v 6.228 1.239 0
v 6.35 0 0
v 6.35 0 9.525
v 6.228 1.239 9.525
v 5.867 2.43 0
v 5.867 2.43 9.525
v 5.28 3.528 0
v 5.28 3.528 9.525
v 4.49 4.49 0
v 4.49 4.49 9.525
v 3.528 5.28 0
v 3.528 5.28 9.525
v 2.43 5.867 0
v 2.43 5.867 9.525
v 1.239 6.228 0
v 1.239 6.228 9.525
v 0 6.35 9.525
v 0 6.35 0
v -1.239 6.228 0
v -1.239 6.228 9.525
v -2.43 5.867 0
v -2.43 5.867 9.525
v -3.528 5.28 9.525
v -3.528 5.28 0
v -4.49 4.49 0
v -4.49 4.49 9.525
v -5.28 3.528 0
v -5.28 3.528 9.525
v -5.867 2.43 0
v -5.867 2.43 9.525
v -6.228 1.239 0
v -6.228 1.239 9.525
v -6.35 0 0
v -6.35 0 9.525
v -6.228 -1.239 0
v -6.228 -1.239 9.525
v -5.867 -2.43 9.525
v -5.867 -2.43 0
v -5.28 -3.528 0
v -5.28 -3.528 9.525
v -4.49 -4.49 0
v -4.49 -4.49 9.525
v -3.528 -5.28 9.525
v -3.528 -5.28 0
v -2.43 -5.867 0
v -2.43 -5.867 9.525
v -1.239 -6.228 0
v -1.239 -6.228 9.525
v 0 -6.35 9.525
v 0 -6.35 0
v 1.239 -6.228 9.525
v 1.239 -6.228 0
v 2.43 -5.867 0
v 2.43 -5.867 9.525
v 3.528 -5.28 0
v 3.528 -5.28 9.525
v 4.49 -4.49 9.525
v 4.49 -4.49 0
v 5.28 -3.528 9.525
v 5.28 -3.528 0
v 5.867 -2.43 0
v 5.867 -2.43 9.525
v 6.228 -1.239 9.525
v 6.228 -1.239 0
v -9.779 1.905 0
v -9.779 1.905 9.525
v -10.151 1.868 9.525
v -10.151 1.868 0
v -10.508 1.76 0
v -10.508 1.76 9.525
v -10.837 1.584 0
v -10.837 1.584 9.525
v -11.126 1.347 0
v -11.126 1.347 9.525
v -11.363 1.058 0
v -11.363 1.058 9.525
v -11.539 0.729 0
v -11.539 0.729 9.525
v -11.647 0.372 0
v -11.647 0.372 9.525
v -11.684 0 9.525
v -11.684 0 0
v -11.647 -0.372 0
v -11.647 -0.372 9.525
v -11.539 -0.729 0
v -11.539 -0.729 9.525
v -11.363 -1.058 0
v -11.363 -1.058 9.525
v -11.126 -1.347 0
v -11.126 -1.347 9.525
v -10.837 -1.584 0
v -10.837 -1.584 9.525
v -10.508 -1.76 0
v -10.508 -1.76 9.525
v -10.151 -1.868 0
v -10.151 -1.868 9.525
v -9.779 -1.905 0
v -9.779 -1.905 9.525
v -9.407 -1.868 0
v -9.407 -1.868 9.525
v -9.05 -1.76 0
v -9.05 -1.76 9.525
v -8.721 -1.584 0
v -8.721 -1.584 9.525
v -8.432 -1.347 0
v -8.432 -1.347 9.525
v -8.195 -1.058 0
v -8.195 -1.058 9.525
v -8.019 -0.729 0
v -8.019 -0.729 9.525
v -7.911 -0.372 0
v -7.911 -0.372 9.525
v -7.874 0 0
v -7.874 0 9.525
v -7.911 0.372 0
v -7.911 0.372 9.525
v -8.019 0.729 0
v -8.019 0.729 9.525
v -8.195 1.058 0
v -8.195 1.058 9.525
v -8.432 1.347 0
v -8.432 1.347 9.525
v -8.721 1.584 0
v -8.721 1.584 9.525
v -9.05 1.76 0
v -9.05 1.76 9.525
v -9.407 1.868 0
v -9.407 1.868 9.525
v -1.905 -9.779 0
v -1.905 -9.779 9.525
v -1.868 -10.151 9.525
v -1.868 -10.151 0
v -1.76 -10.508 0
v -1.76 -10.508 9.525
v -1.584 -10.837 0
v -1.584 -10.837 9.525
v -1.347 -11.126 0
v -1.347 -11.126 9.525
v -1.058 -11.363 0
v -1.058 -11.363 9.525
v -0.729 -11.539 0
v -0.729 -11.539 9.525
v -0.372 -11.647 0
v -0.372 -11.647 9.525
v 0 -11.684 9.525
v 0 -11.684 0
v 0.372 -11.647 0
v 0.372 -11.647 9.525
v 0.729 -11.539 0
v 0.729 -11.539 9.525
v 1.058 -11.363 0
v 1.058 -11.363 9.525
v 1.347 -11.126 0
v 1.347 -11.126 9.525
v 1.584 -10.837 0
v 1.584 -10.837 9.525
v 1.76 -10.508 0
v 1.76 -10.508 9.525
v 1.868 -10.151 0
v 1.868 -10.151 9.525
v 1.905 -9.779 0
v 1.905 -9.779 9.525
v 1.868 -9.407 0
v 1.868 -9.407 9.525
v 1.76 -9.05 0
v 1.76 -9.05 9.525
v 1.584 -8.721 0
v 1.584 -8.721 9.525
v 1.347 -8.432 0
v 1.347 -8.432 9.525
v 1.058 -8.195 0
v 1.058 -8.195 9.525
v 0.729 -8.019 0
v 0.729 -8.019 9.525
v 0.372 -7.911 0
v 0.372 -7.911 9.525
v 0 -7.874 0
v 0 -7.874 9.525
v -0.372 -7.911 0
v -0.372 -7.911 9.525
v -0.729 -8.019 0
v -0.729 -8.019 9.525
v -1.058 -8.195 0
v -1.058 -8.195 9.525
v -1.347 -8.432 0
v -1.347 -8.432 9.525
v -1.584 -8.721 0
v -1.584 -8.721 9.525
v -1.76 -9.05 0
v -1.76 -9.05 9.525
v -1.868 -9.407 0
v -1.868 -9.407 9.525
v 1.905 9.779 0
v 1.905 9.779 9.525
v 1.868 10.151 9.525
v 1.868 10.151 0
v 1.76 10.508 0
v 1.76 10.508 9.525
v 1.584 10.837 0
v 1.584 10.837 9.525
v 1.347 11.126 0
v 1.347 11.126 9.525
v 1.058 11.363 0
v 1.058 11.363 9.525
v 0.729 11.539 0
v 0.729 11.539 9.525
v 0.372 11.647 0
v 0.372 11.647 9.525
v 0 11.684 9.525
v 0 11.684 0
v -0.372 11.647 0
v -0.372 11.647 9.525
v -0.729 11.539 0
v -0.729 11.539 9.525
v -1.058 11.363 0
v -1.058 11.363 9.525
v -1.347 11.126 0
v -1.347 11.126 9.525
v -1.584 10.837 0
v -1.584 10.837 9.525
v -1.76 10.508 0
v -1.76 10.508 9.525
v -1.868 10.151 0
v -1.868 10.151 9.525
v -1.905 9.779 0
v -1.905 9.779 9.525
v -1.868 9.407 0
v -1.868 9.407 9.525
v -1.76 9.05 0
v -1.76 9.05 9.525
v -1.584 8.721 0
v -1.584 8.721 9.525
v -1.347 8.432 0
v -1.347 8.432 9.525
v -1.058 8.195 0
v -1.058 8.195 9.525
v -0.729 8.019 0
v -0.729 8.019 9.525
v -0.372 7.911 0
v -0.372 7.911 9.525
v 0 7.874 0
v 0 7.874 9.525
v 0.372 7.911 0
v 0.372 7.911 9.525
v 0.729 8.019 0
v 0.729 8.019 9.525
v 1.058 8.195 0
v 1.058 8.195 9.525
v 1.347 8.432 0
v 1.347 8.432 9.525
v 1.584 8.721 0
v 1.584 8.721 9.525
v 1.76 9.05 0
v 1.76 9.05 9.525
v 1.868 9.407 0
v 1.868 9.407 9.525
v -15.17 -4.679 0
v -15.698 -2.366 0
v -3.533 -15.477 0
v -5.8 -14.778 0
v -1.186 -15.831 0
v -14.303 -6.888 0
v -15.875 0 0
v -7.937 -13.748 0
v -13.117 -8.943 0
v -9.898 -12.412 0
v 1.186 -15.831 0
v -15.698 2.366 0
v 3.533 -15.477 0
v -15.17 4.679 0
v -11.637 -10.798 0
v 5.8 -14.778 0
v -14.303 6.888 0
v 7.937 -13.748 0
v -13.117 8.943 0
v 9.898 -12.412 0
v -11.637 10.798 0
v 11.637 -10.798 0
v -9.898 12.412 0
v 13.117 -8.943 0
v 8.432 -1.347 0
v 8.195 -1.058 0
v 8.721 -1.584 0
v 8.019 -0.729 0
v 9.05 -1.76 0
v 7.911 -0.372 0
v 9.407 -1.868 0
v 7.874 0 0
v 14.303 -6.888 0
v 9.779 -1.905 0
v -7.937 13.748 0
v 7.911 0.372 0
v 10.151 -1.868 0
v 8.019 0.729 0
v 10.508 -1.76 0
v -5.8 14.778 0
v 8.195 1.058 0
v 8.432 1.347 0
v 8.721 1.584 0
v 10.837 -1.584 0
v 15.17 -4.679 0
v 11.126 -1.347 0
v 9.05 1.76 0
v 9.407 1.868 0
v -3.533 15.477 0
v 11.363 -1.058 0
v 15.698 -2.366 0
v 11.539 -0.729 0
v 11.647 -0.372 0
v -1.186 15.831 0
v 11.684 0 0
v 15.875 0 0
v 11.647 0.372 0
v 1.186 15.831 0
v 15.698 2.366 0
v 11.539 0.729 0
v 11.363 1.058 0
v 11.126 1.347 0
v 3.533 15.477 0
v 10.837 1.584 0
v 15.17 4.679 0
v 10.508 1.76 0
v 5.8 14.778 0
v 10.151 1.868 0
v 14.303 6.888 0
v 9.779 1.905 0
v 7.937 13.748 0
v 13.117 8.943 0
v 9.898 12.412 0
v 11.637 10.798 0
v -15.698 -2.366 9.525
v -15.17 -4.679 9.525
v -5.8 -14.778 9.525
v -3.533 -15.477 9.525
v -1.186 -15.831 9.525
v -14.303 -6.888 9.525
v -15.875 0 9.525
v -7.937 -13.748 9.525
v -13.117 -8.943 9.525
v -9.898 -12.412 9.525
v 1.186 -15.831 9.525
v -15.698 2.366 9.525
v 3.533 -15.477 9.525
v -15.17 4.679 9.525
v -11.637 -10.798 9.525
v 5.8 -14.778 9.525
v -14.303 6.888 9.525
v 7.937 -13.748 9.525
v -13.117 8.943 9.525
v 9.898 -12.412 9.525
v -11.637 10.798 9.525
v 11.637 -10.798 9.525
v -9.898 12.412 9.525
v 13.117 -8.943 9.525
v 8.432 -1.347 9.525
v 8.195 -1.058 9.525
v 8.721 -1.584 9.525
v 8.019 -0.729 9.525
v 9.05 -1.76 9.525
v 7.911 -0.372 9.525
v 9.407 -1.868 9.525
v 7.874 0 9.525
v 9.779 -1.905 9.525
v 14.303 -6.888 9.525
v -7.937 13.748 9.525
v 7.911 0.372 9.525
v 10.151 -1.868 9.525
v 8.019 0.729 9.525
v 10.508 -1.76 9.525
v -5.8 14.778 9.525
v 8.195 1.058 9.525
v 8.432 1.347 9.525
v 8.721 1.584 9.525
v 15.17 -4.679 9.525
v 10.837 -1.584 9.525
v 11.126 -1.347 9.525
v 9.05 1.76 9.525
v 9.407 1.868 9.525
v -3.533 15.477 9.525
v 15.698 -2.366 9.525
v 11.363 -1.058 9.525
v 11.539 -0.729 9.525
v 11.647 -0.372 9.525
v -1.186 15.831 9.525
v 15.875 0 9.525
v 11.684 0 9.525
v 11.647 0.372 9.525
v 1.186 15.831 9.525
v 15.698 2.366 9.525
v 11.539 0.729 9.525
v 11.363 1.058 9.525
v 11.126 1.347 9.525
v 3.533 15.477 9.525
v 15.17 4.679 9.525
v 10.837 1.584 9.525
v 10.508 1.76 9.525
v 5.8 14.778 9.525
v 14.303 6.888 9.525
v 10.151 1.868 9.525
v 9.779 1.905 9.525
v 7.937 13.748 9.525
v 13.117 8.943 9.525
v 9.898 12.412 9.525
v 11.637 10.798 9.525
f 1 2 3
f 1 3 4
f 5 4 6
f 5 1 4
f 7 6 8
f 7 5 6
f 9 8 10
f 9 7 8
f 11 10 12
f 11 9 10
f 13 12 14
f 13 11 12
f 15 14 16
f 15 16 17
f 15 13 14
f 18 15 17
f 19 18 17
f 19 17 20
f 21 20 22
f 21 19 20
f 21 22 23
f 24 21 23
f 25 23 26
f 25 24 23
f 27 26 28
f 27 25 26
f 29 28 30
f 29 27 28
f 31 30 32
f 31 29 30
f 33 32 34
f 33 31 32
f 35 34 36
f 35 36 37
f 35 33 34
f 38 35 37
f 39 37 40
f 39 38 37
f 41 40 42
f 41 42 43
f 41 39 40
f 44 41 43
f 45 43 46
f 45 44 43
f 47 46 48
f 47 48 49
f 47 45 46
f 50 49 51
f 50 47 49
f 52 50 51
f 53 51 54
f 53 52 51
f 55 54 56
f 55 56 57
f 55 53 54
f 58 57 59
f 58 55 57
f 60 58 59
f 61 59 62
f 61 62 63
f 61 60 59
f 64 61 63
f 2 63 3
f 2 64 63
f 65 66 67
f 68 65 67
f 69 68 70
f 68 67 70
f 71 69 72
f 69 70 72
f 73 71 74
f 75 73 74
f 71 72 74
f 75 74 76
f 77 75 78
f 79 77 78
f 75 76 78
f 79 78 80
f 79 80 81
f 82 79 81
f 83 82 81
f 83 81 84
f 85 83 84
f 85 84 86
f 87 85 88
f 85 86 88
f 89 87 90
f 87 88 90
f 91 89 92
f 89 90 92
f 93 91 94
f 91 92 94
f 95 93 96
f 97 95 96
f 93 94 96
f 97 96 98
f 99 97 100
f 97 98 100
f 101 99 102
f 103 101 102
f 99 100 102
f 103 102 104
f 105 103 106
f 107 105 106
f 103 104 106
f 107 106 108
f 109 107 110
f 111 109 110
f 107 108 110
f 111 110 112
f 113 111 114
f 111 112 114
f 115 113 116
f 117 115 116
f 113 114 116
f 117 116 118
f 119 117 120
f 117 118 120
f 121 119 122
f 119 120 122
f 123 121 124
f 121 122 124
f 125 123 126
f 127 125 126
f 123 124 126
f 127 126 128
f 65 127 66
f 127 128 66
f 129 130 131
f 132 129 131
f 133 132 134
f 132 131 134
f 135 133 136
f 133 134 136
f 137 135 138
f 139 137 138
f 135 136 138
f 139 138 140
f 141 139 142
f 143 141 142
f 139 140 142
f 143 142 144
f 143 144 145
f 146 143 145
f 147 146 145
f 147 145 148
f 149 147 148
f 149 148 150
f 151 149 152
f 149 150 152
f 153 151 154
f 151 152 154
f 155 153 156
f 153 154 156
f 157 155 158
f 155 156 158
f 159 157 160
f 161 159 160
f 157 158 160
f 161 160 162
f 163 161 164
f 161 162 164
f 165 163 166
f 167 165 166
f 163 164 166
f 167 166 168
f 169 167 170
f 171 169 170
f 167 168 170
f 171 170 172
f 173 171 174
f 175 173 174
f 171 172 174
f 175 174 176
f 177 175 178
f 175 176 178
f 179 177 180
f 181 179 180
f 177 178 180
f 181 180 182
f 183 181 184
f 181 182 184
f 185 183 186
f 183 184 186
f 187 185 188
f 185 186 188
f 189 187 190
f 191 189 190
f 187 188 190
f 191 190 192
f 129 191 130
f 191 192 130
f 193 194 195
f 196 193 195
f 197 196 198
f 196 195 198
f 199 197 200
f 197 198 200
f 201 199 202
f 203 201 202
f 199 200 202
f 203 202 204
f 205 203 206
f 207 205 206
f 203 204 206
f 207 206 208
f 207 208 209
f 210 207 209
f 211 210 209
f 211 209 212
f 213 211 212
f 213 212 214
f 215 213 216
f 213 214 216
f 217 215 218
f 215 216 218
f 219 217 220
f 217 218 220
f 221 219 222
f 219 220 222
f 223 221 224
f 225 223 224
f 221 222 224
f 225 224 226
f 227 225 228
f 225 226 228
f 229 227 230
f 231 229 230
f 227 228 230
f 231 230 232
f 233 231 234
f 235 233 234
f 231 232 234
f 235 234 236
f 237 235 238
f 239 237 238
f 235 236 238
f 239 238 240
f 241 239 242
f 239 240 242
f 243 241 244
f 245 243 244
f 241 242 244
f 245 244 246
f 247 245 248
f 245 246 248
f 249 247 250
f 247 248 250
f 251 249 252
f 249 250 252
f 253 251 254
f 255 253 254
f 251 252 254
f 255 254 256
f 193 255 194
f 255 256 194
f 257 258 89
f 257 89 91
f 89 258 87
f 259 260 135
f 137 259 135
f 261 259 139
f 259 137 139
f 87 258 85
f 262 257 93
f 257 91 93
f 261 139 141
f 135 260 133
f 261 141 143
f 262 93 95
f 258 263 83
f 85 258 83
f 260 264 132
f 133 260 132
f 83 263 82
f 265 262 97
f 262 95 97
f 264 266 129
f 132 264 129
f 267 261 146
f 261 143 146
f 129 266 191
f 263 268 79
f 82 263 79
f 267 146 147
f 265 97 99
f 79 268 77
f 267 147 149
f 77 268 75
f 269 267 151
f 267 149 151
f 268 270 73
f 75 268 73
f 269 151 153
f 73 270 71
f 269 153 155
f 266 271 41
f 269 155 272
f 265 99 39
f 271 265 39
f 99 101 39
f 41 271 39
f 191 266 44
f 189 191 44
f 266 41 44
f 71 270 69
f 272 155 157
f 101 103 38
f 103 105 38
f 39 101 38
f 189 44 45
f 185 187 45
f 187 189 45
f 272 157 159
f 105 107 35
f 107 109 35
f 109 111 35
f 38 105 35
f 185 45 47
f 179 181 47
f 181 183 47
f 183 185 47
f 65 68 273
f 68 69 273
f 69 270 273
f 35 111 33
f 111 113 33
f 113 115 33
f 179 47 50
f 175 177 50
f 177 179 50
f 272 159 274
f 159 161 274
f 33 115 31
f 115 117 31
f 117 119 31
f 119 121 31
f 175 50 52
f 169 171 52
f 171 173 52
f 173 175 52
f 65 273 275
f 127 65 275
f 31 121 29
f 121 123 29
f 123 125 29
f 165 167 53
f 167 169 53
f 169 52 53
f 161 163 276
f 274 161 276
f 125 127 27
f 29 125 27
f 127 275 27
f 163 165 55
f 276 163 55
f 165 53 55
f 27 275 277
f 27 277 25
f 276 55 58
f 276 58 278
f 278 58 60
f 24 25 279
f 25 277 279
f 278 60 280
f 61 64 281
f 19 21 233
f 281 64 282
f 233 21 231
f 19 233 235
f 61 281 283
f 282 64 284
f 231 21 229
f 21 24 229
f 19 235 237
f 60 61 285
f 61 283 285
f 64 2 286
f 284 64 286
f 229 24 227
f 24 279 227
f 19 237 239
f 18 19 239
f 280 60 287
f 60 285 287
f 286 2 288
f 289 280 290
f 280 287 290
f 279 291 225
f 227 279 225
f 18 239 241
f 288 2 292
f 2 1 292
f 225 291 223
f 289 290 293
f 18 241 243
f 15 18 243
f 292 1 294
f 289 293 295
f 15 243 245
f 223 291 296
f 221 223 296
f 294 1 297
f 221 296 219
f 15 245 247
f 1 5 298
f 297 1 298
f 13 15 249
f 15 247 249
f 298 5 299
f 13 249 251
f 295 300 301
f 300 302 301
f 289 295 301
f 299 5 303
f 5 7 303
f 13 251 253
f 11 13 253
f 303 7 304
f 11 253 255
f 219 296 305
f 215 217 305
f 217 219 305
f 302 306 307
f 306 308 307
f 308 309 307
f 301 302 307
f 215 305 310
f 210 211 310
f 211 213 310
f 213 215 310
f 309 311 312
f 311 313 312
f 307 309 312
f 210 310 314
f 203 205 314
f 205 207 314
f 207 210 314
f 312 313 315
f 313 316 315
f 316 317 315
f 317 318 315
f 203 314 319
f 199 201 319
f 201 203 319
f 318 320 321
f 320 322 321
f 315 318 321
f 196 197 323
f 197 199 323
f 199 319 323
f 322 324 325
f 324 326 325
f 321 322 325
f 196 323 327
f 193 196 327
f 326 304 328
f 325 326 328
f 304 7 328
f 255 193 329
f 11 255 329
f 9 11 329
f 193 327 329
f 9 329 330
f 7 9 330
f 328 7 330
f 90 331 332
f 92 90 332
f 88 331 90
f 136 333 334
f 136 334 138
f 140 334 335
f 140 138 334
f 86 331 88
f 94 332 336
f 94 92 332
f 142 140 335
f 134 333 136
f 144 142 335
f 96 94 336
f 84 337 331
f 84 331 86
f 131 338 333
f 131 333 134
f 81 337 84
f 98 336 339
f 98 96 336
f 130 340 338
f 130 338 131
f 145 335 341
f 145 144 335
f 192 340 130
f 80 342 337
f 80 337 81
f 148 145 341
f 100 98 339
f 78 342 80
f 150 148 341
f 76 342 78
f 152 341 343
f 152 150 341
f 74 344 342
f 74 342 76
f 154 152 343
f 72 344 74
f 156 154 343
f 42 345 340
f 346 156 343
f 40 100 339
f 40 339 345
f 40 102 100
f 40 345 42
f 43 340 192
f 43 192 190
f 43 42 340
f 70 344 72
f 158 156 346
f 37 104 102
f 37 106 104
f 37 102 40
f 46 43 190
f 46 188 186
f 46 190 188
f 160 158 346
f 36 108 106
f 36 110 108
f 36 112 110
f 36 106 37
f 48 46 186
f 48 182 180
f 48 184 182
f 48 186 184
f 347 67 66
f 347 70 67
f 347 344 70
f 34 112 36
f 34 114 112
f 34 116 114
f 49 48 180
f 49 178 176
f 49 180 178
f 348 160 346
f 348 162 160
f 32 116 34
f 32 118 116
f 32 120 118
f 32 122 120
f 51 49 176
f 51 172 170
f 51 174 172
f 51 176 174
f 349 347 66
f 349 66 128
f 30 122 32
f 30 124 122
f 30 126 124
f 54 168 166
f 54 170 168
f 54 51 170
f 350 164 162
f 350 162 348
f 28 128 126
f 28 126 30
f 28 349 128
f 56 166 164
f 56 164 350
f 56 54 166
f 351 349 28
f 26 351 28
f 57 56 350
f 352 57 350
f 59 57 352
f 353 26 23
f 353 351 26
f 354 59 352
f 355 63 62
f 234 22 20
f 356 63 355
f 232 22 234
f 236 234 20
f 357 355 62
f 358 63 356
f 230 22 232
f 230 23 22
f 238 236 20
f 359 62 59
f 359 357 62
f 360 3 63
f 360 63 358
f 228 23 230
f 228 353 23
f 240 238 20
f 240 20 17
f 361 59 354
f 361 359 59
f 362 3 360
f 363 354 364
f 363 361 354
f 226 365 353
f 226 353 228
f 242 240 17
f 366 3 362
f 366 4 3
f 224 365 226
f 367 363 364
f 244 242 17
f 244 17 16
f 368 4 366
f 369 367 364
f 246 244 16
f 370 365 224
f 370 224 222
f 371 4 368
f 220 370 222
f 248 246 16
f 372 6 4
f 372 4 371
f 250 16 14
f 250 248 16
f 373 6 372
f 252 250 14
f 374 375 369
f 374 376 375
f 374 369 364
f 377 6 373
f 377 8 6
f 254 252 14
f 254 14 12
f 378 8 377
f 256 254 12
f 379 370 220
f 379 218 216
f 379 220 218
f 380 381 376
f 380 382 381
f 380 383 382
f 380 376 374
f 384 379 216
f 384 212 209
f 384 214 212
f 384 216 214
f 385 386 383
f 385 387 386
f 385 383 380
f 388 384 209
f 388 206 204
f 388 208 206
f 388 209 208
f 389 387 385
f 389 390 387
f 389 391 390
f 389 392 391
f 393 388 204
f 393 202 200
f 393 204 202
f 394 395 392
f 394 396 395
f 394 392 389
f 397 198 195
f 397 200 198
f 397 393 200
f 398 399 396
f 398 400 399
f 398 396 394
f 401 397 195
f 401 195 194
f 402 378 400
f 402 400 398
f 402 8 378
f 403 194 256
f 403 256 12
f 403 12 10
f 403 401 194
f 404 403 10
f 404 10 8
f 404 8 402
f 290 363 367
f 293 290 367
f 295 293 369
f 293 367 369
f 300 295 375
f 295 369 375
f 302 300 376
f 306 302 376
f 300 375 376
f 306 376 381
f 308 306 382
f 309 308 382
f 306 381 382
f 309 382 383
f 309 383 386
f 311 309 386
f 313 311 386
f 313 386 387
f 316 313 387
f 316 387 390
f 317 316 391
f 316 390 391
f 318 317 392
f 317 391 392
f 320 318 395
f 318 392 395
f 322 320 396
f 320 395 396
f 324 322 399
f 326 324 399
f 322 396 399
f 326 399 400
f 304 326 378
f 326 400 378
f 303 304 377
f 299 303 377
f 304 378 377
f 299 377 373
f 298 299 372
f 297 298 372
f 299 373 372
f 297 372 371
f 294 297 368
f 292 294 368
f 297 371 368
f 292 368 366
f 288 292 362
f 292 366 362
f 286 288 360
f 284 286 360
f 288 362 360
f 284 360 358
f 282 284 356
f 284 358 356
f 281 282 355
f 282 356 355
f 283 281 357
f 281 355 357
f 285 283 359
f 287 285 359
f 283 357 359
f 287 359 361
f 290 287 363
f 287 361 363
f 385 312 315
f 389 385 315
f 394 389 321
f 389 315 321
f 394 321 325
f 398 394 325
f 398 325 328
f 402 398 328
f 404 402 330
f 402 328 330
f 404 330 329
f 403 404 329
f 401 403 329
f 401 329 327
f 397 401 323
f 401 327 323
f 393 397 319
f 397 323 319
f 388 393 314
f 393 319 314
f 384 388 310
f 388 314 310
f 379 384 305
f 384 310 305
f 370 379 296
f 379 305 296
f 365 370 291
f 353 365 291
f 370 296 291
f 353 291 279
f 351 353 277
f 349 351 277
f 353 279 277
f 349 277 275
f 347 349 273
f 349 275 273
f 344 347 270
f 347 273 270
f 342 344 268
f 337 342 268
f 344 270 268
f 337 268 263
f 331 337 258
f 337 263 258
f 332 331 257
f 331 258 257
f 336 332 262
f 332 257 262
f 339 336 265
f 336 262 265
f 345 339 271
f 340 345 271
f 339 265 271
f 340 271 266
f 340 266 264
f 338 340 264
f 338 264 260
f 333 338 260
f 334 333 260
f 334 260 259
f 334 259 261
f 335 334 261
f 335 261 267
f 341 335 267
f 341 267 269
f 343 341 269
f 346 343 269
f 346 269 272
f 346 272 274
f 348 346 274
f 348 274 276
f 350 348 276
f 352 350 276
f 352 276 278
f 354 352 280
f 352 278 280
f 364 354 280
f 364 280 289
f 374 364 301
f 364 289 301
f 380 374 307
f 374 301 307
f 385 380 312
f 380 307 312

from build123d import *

# Parameters (mm, degrees)
SKETCH1_R           = 15.875
SKETCH1_R_2         = 6.35
BOSS_EXTRUDE1_DEPTH = 9.525
SKETCH2_R           = 1.905
CUT_EXTRUDE1_DEPTH  = 9.525
CIRPATTERN1_COUNT   = 4


with BuildPart() as part:
    # Sketch1 → Boss-Extrude1 (new body)
    with BuildSketch(Plane.XY):
        Circle(SKETCH1_R)
        Circle(SKETCH1_R_2, mode=Mode.SUBTRACT)
    extrude(amount=BOSS_EXTRUDE1_DEPTH)

    # Sketch2 → Cut-Extrude1 (cut)
    with BuildSketch(Plane.XY.offset(9.525)):
        with Locations((0, 9.779)):
            Circle(SKETCH2_R)
    cut_extrude1 = extrude(amount=-CUT_EXTRUDE1_DEPTH, mode=Mode.SUBTRACT)

    # CirPattern1: Cut-Extrude1 ×4 about axis
    cirpattern1_axis = Axis((0, 0, 0), (0, 0, 1))
    for i in range(1, CIRPATTERN1_COUNT):
        add(cut_extrude1.rotate(cirpattern1_axis, i * 360 / CIRPATTERN1_COUNT), mode=Mode.SUBTRACT)


solid = part.part
